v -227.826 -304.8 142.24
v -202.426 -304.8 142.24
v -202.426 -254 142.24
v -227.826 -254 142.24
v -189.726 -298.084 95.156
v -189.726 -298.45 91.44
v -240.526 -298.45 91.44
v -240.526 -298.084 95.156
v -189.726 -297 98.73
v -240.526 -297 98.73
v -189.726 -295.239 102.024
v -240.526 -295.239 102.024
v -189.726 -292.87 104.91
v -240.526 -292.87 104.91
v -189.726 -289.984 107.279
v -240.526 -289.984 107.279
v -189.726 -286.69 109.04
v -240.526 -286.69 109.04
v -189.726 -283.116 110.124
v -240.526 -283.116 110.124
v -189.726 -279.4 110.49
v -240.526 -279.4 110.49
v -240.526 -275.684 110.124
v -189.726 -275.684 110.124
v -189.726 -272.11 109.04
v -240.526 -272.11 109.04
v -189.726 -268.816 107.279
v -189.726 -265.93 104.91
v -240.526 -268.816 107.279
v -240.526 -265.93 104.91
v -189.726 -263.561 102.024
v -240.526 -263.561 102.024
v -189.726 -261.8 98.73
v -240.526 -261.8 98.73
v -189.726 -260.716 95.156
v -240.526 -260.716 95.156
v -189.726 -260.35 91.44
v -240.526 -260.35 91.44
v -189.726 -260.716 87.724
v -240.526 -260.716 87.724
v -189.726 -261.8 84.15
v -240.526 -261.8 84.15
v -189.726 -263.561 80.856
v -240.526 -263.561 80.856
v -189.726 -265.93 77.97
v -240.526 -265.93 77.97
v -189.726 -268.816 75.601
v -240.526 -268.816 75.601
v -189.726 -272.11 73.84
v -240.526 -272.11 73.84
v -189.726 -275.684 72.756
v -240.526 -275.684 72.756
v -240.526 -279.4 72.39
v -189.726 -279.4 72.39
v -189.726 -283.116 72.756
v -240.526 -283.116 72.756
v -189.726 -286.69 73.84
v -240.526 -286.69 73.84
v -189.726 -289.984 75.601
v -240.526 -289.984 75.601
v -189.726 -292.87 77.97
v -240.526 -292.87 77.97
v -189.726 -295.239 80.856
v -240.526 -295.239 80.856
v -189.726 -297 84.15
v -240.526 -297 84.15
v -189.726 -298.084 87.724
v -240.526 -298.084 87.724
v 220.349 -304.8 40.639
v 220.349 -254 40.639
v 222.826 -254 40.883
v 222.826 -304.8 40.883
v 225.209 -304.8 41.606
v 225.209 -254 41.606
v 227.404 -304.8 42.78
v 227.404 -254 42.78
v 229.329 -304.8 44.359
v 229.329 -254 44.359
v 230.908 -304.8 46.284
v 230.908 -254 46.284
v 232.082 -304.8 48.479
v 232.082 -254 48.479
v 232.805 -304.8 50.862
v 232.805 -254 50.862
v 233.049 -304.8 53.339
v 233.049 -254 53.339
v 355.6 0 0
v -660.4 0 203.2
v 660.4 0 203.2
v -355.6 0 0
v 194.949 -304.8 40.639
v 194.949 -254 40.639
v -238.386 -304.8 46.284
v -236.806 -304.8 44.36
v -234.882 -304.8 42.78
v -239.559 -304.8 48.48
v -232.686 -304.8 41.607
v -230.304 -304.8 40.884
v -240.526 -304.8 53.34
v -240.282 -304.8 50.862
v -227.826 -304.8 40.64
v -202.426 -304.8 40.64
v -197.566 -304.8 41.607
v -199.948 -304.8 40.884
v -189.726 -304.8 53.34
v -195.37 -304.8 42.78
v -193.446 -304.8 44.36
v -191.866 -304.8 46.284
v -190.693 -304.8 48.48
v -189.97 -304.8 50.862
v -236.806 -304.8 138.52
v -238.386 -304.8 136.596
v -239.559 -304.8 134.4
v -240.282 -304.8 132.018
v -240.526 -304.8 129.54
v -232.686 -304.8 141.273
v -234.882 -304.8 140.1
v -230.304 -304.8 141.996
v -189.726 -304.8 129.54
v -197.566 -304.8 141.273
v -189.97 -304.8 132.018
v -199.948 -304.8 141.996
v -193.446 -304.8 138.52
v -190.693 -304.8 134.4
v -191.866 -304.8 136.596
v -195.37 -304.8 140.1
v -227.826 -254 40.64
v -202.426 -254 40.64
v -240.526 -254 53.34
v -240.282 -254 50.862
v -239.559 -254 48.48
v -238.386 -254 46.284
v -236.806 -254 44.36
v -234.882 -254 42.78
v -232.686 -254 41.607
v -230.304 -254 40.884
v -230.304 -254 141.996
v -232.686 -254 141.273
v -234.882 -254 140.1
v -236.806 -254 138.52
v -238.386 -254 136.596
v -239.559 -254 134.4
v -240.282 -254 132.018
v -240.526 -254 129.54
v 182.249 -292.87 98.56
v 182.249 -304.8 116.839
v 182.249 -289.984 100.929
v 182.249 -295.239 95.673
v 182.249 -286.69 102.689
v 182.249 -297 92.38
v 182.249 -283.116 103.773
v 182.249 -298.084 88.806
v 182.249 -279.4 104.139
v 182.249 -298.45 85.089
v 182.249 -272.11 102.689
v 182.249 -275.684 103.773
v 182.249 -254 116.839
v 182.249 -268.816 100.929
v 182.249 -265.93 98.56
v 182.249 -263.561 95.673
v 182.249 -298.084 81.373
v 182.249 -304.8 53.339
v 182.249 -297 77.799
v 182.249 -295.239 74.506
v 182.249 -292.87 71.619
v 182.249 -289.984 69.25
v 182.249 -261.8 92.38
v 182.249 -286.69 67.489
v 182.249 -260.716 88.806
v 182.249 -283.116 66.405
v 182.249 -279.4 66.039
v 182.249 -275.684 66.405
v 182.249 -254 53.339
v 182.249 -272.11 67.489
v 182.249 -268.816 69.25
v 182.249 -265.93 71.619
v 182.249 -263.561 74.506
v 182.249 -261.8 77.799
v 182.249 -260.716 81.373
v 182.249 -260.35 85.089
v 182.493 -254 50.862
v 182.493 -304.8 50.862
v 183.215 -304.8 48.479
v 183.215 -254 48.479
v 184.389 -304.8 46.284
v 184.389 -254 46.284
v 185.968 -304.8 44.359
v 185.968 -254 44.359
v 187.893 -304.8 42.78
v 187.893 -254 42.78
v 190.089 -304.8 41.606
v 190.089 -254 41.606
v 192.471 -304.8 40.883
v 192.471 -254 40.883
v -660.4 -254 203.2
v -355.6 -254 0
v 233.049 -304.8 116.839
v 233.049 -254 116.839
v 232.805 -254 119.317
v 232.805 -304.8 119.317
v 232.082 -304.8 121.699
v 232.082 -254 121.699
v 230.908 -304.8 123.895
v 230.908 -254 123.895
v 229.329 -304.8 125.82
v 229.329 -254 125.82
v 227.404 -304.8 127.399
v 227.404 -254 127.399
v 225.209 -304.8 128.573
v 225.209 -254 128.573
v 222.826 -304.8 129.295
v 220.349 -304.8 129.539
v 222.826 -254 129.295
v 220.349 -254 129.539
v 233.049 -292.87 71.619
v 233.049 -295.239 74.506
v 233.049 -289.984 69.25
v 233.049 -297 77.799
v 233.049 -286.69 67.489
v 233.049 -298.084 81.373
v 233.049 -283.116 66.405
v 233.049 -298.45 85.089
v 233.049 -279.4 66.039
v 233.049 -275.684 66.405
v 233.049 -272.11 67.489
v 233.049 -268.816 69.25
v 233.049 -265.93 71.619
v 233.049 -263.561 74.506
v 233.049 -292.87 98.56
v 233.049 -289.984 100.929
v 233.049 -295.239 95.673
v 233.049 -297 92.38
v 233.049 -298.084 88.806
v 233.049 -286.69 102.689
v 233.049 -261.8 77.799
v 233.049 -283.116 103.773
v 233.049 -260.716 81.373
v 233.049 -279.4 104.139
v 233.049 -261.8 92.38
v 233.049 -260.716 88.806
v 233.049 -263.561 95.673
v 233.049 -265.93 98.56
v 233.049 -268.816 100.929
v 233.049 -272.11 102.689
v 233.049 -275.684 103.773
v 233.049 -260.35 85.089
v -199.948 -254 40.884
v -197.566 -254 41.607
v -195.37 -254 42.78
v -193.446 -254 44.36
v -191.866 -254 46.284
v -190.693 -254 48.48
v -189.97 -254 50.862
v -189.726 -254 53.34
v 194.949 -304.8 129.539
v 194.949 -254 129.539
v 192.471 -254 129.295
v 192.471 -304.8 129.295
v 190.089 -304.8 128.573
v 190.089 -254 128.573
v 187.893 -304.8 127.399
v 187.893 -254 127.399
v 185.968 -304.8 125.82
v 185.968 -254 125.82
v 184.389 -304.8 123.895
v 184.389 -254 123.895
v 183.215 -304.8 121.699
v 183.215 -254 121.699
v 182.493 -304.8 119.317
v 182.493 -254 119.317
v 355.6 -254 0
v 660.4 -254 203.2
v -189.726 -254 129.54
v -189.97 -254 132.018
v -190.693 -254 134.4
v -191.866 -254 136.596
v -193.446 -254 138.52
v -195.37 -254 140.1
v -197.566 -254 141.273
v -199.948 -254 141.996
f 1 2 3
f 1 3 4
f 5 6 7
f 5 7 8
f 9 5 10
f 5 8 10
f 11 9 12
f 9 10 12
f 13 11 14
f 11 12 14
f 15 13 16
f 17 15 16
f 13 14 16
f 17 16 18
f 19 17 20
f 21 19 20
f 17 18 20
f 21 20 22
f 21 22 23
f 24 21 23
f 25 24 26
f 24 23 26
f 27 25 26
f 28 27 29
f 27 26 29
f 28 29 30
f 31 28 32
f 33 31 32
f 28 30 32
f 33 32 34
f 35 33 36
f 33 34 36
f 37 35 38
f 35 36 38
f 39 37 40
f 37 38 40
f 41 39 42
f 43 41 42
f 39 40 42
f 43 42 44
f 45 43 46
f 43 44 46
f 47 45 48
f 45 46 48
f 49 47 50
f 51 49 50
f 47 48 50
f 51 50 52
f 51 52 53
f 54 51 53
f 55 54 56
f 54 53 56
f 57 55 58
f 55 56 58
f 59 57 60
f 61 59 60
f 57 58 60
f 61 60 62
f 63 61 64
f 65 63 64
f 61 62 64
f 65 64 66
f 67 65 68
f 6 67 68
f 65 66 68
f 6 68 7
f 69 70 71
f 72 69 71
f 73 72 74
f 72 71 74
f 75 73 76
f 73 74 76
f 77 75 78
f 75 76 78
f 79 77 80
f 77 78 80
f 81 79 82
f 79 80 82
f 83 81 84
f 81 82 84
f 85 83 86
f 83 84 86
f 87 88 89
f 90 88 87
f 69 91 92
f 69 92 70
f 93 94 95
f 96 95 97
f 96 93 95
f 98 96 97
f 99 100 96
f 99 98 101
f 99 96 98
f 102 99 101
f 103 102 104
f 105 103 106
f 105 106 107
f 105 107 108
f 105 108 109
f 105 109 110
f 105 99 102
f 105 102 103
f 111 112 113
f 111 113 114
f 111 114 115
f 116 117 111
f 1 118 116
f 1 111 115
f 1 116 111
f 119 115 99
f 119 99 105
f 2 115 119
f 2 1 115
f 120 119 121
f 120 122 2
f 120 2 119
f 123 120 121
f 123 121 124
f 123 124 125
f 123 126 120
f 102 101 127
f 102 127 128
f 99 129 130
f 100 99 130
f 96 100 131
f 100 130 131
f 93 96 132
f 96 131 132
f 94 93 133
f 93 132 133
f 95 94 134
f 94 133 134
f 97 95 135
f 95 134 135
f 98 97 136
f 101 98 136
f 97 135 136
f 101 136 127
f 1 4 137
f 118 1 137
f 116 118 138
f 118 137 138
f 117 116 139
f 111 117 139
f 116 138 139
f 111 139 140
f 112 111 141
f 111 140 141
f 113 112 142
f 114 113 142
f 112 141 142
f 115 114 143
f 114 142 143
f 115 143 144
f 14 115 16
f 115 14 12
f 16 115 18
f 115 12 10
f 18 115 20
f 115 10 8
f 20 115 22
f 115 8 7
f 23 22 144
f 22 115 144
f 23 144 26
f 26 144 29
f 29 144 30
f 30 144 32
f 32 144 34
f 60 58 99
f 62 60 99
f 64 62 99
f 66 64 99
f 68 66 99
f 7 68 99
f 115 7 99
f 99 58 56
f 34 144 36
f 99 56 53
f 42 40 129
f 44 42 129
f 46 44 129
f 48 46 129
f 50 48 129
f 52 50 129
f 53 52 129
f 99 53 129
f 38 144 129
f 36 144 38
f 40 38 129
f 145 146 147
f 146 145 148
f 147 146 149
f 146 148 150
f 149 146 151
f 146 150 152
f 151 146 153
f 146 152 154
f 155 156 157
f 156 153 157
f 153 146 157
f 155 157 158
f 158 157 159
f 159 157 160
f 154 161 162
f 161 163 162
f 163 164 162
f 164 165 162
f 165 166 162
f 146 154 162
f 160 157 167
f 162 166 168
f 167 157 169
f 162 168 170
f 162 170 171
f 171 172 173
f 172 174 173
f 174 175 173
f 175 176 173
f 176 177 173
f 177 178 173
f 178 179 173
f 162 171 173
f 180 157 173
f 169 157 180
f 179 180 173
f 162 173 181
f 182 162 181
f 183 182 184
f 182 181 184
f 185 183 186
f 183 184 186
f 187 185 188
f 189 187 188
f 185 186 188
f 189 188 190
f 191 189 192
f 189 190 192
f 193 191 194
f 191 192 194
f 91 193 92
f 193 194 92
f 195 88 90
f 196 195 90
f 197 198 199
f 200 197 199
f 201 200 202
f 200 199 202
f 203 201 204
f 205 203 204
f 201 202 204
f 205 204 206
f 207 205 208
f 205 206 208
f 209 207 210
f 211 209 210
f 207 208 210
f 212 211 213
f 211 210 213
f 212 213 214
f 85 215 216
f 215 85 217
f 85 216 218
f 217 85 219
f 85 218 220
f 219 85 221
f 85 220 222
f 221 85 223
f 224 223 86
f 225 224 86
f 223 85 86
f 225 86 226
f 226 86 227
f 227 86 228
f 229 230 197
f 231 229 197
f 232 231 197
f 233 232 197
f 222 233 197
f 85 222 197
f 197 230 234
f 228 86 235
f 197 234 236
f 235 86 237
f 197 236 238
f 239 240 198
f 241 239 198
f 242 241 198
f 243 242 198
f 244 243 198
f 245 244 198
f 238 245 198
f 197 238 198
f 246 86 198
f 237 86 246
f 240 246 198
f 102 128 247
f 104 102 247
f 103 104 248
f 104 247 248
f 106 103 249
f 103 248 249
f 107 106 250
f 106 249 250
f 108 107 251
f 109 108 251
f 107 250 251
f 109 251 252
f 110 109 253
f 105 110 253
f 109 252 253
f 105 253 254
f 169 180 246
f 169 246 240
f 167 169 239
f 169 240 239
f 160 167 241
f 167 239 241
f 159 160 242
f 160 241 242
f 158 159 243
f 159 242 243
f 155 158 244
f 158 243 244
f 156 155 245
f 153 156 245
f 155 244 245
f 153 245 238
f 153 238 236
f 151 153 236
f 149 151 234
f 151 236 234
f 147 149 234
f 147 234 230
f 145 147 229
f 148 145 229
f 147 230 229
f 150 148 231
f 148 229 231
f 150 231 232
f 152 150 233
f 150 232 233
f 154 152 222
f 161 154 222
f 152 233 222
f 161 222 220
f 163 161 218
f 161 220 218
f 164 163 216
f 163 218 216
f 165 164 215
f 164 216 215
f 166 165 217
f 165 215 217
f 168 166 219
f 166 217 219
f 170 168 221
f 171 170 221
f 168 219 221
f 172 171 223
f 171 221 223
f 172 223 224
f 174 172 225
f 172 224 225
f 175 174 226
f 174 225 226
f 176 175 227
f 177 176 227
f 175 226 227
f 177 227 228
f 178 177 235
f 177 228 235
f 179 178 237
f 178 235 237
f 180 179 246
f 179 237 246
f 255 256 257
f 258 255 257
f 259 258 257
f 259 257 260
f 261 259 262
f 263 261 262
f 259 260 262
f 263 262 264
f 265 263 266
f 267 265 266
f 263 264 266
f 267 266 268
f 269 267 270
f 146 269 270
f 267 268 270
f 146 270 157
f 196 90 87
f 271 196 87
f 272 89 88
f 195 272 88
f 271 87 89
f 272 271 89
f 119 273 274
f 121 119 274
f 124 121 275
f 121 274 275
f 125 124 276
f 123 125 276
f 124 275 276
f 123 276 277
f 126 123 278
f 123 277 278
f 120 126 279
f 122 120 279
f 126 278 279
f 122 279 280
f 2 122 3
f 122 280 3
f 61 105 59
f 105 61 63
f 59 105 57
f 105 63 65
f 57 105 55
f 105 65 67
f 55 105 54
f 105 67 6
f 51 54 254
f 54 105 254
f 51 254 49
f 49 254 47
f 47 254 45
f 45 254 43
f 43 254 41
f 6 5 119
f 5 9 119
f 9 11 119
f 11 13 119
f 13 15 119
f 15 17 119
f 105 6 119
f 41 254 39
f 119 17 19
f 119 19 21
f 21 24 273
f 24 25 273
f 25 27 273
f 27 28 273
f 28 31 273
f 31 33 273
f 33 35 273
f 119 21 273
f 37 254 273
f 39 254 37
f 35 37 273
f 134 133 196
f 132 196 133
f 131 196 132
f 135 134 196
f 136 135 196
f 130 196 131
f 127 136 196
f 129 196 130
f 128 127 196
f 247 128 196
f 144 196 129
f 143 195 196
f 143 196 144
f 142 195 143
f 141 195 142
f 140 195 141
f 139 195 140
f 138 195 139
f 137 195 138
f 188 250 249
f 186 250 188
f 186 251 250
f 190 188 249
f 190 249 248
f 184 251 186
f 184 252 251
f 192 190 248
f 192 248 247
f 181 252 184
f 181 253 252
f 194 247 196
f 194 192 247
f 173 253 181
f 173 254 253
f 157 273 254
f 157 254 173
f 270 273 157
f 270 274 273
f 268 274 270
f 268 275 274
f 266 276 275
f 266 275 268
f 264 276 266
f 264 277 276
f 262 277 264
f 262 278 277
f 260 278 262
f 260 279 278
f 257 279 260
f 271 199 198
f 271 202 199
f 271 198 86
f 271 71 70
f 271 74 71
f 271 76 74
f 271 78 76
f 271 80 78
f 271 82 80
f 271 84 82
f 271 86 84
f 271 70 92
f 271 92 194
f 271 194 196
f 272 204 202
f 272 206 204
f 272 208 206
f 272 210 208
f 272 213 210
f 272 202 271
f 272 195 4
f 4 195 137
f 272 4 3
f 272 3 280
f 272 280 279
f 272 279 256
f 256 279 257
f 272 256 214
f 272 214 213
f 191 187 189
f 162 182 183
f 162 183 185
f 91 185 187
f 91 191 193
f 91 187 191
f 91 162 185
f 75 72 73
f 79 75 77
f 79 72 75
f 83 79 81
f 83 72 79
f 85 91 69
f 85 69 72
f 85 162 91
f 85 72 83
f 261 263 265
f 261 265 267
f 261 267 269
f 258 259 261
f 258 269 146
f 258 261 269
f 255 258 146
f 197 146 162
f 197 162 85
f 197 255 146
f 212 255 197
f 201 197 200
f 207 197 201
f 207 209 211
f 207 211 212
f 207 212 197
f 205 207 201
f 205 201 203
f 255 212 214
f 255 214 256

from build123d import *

# Parameters (mm, degrees)
F0_W     = 355.6
F0_H     = 203.2
F1_DEPTH = 254
F5_DEPTH = 50.8
F6_R     = 19.05
F7_DEPTH = 50.8
F8_R     = 19.05
F9_DEPTH = 50.8


with BuildPart() as f1:
    # F0 (on Front) → F1 (new body)
    with BuildSketch(Plane.XZ):
        with Locations((177.8, 101.6)):
            Rectangle(F0_W, F0_H)
        with Locations((-177.8, 101.6)):
            Rectangle(F0_W, F0_H)
        Polygon((355.6, 203.2), (355.6, 0), (660.4, 203.2), align=None)
        Polygon((-660.4, 203.2), (-355.6, 0), (-355.6, 203.2), align=None)
    extrude(amount=F1_DEPTH)

    # F4 (on face) + F3 (on face) → F5 (join)
    with BuildSketch(Plane.XZ.offset(254)):
        with BuildLine():
            ThreePointArc((-240.525891, 53.34), (-236.806147, 44.359744), (-227.825891, 40.64))
            Line((-227.825891, 40.64), (-202.425891, 40.64))
            ThreePointArc((-202.425891, 40.64), (-193.445635, 44.359744), (-189.725891, 53.34))
            Line((-189.725891, 53.34), (-189.725891, 129.54))
            ThreePointArc((-189.725891, 129.54), (-193.445635, 138.520256), (-202.425891, 142.24))
            Line((-202.425891, 142.24), (-227.825891, 142.24))
            ThreePointArc((-227.825891, 142.24), (-236.806147, 138.520256), (-240.525891, 129.54))
            Line((-240.525891, 129.54), (-240.525891, 53.34))
        make_face()
    with BuildSketch(Plane.XZ.offset(254)):
        with BuildLine():
            ThreePointArc((233.048756, 116.839396), (229.329012, 125.819652), (220.348756, 129.539396))
            Line((220.348756, 129.539396), (194.948756, 129.539396))
            ThreePointArc((194.948756, 129.539396), (185.9685, 125.819652), (182.248756, 116.839396))
            Line((182.248756, 116.839396), (182.248756, 53.339396))
            ThreePointArc((182.248756, 53.339396), (185.9685, 44.35914), (194.948756, 40.639396))
            Line((194.948756, 40.639396), (220.348756, 40.639396))
            ThreePointArc((220.348756, 40.639396), (229.329012, 44.35914), (233.048756, 53.339396))
            Line((233.048756, 53.339396), (233.048756, 116.839396))
        make_face()
    extrude(amount=F5_DEPTH)

    # F6 (on face) → F7 (cut)
    with BuildSketch(Plane.YZ.offset(233.048756)):
        with Locations((-279.4, 85.089396)):
            Circle(F6_R)
    extrude(amount=-F7_DEPTH, mode=Mode.SUBTRACT)

    # F8 (on face) → F9 (cut)
    with BuildSketch(Plane(origin=(-240.525891, 0, 0), x_dir=(0, -1, 0), z_dir=(-1, 0, 0))):
        with Locations((279.4, 91.44)):
            Circle(F8_R)
    extrude(amount=-F9_DEPTH, mode=Mode.SUBTRACT)


solid = f1.part
